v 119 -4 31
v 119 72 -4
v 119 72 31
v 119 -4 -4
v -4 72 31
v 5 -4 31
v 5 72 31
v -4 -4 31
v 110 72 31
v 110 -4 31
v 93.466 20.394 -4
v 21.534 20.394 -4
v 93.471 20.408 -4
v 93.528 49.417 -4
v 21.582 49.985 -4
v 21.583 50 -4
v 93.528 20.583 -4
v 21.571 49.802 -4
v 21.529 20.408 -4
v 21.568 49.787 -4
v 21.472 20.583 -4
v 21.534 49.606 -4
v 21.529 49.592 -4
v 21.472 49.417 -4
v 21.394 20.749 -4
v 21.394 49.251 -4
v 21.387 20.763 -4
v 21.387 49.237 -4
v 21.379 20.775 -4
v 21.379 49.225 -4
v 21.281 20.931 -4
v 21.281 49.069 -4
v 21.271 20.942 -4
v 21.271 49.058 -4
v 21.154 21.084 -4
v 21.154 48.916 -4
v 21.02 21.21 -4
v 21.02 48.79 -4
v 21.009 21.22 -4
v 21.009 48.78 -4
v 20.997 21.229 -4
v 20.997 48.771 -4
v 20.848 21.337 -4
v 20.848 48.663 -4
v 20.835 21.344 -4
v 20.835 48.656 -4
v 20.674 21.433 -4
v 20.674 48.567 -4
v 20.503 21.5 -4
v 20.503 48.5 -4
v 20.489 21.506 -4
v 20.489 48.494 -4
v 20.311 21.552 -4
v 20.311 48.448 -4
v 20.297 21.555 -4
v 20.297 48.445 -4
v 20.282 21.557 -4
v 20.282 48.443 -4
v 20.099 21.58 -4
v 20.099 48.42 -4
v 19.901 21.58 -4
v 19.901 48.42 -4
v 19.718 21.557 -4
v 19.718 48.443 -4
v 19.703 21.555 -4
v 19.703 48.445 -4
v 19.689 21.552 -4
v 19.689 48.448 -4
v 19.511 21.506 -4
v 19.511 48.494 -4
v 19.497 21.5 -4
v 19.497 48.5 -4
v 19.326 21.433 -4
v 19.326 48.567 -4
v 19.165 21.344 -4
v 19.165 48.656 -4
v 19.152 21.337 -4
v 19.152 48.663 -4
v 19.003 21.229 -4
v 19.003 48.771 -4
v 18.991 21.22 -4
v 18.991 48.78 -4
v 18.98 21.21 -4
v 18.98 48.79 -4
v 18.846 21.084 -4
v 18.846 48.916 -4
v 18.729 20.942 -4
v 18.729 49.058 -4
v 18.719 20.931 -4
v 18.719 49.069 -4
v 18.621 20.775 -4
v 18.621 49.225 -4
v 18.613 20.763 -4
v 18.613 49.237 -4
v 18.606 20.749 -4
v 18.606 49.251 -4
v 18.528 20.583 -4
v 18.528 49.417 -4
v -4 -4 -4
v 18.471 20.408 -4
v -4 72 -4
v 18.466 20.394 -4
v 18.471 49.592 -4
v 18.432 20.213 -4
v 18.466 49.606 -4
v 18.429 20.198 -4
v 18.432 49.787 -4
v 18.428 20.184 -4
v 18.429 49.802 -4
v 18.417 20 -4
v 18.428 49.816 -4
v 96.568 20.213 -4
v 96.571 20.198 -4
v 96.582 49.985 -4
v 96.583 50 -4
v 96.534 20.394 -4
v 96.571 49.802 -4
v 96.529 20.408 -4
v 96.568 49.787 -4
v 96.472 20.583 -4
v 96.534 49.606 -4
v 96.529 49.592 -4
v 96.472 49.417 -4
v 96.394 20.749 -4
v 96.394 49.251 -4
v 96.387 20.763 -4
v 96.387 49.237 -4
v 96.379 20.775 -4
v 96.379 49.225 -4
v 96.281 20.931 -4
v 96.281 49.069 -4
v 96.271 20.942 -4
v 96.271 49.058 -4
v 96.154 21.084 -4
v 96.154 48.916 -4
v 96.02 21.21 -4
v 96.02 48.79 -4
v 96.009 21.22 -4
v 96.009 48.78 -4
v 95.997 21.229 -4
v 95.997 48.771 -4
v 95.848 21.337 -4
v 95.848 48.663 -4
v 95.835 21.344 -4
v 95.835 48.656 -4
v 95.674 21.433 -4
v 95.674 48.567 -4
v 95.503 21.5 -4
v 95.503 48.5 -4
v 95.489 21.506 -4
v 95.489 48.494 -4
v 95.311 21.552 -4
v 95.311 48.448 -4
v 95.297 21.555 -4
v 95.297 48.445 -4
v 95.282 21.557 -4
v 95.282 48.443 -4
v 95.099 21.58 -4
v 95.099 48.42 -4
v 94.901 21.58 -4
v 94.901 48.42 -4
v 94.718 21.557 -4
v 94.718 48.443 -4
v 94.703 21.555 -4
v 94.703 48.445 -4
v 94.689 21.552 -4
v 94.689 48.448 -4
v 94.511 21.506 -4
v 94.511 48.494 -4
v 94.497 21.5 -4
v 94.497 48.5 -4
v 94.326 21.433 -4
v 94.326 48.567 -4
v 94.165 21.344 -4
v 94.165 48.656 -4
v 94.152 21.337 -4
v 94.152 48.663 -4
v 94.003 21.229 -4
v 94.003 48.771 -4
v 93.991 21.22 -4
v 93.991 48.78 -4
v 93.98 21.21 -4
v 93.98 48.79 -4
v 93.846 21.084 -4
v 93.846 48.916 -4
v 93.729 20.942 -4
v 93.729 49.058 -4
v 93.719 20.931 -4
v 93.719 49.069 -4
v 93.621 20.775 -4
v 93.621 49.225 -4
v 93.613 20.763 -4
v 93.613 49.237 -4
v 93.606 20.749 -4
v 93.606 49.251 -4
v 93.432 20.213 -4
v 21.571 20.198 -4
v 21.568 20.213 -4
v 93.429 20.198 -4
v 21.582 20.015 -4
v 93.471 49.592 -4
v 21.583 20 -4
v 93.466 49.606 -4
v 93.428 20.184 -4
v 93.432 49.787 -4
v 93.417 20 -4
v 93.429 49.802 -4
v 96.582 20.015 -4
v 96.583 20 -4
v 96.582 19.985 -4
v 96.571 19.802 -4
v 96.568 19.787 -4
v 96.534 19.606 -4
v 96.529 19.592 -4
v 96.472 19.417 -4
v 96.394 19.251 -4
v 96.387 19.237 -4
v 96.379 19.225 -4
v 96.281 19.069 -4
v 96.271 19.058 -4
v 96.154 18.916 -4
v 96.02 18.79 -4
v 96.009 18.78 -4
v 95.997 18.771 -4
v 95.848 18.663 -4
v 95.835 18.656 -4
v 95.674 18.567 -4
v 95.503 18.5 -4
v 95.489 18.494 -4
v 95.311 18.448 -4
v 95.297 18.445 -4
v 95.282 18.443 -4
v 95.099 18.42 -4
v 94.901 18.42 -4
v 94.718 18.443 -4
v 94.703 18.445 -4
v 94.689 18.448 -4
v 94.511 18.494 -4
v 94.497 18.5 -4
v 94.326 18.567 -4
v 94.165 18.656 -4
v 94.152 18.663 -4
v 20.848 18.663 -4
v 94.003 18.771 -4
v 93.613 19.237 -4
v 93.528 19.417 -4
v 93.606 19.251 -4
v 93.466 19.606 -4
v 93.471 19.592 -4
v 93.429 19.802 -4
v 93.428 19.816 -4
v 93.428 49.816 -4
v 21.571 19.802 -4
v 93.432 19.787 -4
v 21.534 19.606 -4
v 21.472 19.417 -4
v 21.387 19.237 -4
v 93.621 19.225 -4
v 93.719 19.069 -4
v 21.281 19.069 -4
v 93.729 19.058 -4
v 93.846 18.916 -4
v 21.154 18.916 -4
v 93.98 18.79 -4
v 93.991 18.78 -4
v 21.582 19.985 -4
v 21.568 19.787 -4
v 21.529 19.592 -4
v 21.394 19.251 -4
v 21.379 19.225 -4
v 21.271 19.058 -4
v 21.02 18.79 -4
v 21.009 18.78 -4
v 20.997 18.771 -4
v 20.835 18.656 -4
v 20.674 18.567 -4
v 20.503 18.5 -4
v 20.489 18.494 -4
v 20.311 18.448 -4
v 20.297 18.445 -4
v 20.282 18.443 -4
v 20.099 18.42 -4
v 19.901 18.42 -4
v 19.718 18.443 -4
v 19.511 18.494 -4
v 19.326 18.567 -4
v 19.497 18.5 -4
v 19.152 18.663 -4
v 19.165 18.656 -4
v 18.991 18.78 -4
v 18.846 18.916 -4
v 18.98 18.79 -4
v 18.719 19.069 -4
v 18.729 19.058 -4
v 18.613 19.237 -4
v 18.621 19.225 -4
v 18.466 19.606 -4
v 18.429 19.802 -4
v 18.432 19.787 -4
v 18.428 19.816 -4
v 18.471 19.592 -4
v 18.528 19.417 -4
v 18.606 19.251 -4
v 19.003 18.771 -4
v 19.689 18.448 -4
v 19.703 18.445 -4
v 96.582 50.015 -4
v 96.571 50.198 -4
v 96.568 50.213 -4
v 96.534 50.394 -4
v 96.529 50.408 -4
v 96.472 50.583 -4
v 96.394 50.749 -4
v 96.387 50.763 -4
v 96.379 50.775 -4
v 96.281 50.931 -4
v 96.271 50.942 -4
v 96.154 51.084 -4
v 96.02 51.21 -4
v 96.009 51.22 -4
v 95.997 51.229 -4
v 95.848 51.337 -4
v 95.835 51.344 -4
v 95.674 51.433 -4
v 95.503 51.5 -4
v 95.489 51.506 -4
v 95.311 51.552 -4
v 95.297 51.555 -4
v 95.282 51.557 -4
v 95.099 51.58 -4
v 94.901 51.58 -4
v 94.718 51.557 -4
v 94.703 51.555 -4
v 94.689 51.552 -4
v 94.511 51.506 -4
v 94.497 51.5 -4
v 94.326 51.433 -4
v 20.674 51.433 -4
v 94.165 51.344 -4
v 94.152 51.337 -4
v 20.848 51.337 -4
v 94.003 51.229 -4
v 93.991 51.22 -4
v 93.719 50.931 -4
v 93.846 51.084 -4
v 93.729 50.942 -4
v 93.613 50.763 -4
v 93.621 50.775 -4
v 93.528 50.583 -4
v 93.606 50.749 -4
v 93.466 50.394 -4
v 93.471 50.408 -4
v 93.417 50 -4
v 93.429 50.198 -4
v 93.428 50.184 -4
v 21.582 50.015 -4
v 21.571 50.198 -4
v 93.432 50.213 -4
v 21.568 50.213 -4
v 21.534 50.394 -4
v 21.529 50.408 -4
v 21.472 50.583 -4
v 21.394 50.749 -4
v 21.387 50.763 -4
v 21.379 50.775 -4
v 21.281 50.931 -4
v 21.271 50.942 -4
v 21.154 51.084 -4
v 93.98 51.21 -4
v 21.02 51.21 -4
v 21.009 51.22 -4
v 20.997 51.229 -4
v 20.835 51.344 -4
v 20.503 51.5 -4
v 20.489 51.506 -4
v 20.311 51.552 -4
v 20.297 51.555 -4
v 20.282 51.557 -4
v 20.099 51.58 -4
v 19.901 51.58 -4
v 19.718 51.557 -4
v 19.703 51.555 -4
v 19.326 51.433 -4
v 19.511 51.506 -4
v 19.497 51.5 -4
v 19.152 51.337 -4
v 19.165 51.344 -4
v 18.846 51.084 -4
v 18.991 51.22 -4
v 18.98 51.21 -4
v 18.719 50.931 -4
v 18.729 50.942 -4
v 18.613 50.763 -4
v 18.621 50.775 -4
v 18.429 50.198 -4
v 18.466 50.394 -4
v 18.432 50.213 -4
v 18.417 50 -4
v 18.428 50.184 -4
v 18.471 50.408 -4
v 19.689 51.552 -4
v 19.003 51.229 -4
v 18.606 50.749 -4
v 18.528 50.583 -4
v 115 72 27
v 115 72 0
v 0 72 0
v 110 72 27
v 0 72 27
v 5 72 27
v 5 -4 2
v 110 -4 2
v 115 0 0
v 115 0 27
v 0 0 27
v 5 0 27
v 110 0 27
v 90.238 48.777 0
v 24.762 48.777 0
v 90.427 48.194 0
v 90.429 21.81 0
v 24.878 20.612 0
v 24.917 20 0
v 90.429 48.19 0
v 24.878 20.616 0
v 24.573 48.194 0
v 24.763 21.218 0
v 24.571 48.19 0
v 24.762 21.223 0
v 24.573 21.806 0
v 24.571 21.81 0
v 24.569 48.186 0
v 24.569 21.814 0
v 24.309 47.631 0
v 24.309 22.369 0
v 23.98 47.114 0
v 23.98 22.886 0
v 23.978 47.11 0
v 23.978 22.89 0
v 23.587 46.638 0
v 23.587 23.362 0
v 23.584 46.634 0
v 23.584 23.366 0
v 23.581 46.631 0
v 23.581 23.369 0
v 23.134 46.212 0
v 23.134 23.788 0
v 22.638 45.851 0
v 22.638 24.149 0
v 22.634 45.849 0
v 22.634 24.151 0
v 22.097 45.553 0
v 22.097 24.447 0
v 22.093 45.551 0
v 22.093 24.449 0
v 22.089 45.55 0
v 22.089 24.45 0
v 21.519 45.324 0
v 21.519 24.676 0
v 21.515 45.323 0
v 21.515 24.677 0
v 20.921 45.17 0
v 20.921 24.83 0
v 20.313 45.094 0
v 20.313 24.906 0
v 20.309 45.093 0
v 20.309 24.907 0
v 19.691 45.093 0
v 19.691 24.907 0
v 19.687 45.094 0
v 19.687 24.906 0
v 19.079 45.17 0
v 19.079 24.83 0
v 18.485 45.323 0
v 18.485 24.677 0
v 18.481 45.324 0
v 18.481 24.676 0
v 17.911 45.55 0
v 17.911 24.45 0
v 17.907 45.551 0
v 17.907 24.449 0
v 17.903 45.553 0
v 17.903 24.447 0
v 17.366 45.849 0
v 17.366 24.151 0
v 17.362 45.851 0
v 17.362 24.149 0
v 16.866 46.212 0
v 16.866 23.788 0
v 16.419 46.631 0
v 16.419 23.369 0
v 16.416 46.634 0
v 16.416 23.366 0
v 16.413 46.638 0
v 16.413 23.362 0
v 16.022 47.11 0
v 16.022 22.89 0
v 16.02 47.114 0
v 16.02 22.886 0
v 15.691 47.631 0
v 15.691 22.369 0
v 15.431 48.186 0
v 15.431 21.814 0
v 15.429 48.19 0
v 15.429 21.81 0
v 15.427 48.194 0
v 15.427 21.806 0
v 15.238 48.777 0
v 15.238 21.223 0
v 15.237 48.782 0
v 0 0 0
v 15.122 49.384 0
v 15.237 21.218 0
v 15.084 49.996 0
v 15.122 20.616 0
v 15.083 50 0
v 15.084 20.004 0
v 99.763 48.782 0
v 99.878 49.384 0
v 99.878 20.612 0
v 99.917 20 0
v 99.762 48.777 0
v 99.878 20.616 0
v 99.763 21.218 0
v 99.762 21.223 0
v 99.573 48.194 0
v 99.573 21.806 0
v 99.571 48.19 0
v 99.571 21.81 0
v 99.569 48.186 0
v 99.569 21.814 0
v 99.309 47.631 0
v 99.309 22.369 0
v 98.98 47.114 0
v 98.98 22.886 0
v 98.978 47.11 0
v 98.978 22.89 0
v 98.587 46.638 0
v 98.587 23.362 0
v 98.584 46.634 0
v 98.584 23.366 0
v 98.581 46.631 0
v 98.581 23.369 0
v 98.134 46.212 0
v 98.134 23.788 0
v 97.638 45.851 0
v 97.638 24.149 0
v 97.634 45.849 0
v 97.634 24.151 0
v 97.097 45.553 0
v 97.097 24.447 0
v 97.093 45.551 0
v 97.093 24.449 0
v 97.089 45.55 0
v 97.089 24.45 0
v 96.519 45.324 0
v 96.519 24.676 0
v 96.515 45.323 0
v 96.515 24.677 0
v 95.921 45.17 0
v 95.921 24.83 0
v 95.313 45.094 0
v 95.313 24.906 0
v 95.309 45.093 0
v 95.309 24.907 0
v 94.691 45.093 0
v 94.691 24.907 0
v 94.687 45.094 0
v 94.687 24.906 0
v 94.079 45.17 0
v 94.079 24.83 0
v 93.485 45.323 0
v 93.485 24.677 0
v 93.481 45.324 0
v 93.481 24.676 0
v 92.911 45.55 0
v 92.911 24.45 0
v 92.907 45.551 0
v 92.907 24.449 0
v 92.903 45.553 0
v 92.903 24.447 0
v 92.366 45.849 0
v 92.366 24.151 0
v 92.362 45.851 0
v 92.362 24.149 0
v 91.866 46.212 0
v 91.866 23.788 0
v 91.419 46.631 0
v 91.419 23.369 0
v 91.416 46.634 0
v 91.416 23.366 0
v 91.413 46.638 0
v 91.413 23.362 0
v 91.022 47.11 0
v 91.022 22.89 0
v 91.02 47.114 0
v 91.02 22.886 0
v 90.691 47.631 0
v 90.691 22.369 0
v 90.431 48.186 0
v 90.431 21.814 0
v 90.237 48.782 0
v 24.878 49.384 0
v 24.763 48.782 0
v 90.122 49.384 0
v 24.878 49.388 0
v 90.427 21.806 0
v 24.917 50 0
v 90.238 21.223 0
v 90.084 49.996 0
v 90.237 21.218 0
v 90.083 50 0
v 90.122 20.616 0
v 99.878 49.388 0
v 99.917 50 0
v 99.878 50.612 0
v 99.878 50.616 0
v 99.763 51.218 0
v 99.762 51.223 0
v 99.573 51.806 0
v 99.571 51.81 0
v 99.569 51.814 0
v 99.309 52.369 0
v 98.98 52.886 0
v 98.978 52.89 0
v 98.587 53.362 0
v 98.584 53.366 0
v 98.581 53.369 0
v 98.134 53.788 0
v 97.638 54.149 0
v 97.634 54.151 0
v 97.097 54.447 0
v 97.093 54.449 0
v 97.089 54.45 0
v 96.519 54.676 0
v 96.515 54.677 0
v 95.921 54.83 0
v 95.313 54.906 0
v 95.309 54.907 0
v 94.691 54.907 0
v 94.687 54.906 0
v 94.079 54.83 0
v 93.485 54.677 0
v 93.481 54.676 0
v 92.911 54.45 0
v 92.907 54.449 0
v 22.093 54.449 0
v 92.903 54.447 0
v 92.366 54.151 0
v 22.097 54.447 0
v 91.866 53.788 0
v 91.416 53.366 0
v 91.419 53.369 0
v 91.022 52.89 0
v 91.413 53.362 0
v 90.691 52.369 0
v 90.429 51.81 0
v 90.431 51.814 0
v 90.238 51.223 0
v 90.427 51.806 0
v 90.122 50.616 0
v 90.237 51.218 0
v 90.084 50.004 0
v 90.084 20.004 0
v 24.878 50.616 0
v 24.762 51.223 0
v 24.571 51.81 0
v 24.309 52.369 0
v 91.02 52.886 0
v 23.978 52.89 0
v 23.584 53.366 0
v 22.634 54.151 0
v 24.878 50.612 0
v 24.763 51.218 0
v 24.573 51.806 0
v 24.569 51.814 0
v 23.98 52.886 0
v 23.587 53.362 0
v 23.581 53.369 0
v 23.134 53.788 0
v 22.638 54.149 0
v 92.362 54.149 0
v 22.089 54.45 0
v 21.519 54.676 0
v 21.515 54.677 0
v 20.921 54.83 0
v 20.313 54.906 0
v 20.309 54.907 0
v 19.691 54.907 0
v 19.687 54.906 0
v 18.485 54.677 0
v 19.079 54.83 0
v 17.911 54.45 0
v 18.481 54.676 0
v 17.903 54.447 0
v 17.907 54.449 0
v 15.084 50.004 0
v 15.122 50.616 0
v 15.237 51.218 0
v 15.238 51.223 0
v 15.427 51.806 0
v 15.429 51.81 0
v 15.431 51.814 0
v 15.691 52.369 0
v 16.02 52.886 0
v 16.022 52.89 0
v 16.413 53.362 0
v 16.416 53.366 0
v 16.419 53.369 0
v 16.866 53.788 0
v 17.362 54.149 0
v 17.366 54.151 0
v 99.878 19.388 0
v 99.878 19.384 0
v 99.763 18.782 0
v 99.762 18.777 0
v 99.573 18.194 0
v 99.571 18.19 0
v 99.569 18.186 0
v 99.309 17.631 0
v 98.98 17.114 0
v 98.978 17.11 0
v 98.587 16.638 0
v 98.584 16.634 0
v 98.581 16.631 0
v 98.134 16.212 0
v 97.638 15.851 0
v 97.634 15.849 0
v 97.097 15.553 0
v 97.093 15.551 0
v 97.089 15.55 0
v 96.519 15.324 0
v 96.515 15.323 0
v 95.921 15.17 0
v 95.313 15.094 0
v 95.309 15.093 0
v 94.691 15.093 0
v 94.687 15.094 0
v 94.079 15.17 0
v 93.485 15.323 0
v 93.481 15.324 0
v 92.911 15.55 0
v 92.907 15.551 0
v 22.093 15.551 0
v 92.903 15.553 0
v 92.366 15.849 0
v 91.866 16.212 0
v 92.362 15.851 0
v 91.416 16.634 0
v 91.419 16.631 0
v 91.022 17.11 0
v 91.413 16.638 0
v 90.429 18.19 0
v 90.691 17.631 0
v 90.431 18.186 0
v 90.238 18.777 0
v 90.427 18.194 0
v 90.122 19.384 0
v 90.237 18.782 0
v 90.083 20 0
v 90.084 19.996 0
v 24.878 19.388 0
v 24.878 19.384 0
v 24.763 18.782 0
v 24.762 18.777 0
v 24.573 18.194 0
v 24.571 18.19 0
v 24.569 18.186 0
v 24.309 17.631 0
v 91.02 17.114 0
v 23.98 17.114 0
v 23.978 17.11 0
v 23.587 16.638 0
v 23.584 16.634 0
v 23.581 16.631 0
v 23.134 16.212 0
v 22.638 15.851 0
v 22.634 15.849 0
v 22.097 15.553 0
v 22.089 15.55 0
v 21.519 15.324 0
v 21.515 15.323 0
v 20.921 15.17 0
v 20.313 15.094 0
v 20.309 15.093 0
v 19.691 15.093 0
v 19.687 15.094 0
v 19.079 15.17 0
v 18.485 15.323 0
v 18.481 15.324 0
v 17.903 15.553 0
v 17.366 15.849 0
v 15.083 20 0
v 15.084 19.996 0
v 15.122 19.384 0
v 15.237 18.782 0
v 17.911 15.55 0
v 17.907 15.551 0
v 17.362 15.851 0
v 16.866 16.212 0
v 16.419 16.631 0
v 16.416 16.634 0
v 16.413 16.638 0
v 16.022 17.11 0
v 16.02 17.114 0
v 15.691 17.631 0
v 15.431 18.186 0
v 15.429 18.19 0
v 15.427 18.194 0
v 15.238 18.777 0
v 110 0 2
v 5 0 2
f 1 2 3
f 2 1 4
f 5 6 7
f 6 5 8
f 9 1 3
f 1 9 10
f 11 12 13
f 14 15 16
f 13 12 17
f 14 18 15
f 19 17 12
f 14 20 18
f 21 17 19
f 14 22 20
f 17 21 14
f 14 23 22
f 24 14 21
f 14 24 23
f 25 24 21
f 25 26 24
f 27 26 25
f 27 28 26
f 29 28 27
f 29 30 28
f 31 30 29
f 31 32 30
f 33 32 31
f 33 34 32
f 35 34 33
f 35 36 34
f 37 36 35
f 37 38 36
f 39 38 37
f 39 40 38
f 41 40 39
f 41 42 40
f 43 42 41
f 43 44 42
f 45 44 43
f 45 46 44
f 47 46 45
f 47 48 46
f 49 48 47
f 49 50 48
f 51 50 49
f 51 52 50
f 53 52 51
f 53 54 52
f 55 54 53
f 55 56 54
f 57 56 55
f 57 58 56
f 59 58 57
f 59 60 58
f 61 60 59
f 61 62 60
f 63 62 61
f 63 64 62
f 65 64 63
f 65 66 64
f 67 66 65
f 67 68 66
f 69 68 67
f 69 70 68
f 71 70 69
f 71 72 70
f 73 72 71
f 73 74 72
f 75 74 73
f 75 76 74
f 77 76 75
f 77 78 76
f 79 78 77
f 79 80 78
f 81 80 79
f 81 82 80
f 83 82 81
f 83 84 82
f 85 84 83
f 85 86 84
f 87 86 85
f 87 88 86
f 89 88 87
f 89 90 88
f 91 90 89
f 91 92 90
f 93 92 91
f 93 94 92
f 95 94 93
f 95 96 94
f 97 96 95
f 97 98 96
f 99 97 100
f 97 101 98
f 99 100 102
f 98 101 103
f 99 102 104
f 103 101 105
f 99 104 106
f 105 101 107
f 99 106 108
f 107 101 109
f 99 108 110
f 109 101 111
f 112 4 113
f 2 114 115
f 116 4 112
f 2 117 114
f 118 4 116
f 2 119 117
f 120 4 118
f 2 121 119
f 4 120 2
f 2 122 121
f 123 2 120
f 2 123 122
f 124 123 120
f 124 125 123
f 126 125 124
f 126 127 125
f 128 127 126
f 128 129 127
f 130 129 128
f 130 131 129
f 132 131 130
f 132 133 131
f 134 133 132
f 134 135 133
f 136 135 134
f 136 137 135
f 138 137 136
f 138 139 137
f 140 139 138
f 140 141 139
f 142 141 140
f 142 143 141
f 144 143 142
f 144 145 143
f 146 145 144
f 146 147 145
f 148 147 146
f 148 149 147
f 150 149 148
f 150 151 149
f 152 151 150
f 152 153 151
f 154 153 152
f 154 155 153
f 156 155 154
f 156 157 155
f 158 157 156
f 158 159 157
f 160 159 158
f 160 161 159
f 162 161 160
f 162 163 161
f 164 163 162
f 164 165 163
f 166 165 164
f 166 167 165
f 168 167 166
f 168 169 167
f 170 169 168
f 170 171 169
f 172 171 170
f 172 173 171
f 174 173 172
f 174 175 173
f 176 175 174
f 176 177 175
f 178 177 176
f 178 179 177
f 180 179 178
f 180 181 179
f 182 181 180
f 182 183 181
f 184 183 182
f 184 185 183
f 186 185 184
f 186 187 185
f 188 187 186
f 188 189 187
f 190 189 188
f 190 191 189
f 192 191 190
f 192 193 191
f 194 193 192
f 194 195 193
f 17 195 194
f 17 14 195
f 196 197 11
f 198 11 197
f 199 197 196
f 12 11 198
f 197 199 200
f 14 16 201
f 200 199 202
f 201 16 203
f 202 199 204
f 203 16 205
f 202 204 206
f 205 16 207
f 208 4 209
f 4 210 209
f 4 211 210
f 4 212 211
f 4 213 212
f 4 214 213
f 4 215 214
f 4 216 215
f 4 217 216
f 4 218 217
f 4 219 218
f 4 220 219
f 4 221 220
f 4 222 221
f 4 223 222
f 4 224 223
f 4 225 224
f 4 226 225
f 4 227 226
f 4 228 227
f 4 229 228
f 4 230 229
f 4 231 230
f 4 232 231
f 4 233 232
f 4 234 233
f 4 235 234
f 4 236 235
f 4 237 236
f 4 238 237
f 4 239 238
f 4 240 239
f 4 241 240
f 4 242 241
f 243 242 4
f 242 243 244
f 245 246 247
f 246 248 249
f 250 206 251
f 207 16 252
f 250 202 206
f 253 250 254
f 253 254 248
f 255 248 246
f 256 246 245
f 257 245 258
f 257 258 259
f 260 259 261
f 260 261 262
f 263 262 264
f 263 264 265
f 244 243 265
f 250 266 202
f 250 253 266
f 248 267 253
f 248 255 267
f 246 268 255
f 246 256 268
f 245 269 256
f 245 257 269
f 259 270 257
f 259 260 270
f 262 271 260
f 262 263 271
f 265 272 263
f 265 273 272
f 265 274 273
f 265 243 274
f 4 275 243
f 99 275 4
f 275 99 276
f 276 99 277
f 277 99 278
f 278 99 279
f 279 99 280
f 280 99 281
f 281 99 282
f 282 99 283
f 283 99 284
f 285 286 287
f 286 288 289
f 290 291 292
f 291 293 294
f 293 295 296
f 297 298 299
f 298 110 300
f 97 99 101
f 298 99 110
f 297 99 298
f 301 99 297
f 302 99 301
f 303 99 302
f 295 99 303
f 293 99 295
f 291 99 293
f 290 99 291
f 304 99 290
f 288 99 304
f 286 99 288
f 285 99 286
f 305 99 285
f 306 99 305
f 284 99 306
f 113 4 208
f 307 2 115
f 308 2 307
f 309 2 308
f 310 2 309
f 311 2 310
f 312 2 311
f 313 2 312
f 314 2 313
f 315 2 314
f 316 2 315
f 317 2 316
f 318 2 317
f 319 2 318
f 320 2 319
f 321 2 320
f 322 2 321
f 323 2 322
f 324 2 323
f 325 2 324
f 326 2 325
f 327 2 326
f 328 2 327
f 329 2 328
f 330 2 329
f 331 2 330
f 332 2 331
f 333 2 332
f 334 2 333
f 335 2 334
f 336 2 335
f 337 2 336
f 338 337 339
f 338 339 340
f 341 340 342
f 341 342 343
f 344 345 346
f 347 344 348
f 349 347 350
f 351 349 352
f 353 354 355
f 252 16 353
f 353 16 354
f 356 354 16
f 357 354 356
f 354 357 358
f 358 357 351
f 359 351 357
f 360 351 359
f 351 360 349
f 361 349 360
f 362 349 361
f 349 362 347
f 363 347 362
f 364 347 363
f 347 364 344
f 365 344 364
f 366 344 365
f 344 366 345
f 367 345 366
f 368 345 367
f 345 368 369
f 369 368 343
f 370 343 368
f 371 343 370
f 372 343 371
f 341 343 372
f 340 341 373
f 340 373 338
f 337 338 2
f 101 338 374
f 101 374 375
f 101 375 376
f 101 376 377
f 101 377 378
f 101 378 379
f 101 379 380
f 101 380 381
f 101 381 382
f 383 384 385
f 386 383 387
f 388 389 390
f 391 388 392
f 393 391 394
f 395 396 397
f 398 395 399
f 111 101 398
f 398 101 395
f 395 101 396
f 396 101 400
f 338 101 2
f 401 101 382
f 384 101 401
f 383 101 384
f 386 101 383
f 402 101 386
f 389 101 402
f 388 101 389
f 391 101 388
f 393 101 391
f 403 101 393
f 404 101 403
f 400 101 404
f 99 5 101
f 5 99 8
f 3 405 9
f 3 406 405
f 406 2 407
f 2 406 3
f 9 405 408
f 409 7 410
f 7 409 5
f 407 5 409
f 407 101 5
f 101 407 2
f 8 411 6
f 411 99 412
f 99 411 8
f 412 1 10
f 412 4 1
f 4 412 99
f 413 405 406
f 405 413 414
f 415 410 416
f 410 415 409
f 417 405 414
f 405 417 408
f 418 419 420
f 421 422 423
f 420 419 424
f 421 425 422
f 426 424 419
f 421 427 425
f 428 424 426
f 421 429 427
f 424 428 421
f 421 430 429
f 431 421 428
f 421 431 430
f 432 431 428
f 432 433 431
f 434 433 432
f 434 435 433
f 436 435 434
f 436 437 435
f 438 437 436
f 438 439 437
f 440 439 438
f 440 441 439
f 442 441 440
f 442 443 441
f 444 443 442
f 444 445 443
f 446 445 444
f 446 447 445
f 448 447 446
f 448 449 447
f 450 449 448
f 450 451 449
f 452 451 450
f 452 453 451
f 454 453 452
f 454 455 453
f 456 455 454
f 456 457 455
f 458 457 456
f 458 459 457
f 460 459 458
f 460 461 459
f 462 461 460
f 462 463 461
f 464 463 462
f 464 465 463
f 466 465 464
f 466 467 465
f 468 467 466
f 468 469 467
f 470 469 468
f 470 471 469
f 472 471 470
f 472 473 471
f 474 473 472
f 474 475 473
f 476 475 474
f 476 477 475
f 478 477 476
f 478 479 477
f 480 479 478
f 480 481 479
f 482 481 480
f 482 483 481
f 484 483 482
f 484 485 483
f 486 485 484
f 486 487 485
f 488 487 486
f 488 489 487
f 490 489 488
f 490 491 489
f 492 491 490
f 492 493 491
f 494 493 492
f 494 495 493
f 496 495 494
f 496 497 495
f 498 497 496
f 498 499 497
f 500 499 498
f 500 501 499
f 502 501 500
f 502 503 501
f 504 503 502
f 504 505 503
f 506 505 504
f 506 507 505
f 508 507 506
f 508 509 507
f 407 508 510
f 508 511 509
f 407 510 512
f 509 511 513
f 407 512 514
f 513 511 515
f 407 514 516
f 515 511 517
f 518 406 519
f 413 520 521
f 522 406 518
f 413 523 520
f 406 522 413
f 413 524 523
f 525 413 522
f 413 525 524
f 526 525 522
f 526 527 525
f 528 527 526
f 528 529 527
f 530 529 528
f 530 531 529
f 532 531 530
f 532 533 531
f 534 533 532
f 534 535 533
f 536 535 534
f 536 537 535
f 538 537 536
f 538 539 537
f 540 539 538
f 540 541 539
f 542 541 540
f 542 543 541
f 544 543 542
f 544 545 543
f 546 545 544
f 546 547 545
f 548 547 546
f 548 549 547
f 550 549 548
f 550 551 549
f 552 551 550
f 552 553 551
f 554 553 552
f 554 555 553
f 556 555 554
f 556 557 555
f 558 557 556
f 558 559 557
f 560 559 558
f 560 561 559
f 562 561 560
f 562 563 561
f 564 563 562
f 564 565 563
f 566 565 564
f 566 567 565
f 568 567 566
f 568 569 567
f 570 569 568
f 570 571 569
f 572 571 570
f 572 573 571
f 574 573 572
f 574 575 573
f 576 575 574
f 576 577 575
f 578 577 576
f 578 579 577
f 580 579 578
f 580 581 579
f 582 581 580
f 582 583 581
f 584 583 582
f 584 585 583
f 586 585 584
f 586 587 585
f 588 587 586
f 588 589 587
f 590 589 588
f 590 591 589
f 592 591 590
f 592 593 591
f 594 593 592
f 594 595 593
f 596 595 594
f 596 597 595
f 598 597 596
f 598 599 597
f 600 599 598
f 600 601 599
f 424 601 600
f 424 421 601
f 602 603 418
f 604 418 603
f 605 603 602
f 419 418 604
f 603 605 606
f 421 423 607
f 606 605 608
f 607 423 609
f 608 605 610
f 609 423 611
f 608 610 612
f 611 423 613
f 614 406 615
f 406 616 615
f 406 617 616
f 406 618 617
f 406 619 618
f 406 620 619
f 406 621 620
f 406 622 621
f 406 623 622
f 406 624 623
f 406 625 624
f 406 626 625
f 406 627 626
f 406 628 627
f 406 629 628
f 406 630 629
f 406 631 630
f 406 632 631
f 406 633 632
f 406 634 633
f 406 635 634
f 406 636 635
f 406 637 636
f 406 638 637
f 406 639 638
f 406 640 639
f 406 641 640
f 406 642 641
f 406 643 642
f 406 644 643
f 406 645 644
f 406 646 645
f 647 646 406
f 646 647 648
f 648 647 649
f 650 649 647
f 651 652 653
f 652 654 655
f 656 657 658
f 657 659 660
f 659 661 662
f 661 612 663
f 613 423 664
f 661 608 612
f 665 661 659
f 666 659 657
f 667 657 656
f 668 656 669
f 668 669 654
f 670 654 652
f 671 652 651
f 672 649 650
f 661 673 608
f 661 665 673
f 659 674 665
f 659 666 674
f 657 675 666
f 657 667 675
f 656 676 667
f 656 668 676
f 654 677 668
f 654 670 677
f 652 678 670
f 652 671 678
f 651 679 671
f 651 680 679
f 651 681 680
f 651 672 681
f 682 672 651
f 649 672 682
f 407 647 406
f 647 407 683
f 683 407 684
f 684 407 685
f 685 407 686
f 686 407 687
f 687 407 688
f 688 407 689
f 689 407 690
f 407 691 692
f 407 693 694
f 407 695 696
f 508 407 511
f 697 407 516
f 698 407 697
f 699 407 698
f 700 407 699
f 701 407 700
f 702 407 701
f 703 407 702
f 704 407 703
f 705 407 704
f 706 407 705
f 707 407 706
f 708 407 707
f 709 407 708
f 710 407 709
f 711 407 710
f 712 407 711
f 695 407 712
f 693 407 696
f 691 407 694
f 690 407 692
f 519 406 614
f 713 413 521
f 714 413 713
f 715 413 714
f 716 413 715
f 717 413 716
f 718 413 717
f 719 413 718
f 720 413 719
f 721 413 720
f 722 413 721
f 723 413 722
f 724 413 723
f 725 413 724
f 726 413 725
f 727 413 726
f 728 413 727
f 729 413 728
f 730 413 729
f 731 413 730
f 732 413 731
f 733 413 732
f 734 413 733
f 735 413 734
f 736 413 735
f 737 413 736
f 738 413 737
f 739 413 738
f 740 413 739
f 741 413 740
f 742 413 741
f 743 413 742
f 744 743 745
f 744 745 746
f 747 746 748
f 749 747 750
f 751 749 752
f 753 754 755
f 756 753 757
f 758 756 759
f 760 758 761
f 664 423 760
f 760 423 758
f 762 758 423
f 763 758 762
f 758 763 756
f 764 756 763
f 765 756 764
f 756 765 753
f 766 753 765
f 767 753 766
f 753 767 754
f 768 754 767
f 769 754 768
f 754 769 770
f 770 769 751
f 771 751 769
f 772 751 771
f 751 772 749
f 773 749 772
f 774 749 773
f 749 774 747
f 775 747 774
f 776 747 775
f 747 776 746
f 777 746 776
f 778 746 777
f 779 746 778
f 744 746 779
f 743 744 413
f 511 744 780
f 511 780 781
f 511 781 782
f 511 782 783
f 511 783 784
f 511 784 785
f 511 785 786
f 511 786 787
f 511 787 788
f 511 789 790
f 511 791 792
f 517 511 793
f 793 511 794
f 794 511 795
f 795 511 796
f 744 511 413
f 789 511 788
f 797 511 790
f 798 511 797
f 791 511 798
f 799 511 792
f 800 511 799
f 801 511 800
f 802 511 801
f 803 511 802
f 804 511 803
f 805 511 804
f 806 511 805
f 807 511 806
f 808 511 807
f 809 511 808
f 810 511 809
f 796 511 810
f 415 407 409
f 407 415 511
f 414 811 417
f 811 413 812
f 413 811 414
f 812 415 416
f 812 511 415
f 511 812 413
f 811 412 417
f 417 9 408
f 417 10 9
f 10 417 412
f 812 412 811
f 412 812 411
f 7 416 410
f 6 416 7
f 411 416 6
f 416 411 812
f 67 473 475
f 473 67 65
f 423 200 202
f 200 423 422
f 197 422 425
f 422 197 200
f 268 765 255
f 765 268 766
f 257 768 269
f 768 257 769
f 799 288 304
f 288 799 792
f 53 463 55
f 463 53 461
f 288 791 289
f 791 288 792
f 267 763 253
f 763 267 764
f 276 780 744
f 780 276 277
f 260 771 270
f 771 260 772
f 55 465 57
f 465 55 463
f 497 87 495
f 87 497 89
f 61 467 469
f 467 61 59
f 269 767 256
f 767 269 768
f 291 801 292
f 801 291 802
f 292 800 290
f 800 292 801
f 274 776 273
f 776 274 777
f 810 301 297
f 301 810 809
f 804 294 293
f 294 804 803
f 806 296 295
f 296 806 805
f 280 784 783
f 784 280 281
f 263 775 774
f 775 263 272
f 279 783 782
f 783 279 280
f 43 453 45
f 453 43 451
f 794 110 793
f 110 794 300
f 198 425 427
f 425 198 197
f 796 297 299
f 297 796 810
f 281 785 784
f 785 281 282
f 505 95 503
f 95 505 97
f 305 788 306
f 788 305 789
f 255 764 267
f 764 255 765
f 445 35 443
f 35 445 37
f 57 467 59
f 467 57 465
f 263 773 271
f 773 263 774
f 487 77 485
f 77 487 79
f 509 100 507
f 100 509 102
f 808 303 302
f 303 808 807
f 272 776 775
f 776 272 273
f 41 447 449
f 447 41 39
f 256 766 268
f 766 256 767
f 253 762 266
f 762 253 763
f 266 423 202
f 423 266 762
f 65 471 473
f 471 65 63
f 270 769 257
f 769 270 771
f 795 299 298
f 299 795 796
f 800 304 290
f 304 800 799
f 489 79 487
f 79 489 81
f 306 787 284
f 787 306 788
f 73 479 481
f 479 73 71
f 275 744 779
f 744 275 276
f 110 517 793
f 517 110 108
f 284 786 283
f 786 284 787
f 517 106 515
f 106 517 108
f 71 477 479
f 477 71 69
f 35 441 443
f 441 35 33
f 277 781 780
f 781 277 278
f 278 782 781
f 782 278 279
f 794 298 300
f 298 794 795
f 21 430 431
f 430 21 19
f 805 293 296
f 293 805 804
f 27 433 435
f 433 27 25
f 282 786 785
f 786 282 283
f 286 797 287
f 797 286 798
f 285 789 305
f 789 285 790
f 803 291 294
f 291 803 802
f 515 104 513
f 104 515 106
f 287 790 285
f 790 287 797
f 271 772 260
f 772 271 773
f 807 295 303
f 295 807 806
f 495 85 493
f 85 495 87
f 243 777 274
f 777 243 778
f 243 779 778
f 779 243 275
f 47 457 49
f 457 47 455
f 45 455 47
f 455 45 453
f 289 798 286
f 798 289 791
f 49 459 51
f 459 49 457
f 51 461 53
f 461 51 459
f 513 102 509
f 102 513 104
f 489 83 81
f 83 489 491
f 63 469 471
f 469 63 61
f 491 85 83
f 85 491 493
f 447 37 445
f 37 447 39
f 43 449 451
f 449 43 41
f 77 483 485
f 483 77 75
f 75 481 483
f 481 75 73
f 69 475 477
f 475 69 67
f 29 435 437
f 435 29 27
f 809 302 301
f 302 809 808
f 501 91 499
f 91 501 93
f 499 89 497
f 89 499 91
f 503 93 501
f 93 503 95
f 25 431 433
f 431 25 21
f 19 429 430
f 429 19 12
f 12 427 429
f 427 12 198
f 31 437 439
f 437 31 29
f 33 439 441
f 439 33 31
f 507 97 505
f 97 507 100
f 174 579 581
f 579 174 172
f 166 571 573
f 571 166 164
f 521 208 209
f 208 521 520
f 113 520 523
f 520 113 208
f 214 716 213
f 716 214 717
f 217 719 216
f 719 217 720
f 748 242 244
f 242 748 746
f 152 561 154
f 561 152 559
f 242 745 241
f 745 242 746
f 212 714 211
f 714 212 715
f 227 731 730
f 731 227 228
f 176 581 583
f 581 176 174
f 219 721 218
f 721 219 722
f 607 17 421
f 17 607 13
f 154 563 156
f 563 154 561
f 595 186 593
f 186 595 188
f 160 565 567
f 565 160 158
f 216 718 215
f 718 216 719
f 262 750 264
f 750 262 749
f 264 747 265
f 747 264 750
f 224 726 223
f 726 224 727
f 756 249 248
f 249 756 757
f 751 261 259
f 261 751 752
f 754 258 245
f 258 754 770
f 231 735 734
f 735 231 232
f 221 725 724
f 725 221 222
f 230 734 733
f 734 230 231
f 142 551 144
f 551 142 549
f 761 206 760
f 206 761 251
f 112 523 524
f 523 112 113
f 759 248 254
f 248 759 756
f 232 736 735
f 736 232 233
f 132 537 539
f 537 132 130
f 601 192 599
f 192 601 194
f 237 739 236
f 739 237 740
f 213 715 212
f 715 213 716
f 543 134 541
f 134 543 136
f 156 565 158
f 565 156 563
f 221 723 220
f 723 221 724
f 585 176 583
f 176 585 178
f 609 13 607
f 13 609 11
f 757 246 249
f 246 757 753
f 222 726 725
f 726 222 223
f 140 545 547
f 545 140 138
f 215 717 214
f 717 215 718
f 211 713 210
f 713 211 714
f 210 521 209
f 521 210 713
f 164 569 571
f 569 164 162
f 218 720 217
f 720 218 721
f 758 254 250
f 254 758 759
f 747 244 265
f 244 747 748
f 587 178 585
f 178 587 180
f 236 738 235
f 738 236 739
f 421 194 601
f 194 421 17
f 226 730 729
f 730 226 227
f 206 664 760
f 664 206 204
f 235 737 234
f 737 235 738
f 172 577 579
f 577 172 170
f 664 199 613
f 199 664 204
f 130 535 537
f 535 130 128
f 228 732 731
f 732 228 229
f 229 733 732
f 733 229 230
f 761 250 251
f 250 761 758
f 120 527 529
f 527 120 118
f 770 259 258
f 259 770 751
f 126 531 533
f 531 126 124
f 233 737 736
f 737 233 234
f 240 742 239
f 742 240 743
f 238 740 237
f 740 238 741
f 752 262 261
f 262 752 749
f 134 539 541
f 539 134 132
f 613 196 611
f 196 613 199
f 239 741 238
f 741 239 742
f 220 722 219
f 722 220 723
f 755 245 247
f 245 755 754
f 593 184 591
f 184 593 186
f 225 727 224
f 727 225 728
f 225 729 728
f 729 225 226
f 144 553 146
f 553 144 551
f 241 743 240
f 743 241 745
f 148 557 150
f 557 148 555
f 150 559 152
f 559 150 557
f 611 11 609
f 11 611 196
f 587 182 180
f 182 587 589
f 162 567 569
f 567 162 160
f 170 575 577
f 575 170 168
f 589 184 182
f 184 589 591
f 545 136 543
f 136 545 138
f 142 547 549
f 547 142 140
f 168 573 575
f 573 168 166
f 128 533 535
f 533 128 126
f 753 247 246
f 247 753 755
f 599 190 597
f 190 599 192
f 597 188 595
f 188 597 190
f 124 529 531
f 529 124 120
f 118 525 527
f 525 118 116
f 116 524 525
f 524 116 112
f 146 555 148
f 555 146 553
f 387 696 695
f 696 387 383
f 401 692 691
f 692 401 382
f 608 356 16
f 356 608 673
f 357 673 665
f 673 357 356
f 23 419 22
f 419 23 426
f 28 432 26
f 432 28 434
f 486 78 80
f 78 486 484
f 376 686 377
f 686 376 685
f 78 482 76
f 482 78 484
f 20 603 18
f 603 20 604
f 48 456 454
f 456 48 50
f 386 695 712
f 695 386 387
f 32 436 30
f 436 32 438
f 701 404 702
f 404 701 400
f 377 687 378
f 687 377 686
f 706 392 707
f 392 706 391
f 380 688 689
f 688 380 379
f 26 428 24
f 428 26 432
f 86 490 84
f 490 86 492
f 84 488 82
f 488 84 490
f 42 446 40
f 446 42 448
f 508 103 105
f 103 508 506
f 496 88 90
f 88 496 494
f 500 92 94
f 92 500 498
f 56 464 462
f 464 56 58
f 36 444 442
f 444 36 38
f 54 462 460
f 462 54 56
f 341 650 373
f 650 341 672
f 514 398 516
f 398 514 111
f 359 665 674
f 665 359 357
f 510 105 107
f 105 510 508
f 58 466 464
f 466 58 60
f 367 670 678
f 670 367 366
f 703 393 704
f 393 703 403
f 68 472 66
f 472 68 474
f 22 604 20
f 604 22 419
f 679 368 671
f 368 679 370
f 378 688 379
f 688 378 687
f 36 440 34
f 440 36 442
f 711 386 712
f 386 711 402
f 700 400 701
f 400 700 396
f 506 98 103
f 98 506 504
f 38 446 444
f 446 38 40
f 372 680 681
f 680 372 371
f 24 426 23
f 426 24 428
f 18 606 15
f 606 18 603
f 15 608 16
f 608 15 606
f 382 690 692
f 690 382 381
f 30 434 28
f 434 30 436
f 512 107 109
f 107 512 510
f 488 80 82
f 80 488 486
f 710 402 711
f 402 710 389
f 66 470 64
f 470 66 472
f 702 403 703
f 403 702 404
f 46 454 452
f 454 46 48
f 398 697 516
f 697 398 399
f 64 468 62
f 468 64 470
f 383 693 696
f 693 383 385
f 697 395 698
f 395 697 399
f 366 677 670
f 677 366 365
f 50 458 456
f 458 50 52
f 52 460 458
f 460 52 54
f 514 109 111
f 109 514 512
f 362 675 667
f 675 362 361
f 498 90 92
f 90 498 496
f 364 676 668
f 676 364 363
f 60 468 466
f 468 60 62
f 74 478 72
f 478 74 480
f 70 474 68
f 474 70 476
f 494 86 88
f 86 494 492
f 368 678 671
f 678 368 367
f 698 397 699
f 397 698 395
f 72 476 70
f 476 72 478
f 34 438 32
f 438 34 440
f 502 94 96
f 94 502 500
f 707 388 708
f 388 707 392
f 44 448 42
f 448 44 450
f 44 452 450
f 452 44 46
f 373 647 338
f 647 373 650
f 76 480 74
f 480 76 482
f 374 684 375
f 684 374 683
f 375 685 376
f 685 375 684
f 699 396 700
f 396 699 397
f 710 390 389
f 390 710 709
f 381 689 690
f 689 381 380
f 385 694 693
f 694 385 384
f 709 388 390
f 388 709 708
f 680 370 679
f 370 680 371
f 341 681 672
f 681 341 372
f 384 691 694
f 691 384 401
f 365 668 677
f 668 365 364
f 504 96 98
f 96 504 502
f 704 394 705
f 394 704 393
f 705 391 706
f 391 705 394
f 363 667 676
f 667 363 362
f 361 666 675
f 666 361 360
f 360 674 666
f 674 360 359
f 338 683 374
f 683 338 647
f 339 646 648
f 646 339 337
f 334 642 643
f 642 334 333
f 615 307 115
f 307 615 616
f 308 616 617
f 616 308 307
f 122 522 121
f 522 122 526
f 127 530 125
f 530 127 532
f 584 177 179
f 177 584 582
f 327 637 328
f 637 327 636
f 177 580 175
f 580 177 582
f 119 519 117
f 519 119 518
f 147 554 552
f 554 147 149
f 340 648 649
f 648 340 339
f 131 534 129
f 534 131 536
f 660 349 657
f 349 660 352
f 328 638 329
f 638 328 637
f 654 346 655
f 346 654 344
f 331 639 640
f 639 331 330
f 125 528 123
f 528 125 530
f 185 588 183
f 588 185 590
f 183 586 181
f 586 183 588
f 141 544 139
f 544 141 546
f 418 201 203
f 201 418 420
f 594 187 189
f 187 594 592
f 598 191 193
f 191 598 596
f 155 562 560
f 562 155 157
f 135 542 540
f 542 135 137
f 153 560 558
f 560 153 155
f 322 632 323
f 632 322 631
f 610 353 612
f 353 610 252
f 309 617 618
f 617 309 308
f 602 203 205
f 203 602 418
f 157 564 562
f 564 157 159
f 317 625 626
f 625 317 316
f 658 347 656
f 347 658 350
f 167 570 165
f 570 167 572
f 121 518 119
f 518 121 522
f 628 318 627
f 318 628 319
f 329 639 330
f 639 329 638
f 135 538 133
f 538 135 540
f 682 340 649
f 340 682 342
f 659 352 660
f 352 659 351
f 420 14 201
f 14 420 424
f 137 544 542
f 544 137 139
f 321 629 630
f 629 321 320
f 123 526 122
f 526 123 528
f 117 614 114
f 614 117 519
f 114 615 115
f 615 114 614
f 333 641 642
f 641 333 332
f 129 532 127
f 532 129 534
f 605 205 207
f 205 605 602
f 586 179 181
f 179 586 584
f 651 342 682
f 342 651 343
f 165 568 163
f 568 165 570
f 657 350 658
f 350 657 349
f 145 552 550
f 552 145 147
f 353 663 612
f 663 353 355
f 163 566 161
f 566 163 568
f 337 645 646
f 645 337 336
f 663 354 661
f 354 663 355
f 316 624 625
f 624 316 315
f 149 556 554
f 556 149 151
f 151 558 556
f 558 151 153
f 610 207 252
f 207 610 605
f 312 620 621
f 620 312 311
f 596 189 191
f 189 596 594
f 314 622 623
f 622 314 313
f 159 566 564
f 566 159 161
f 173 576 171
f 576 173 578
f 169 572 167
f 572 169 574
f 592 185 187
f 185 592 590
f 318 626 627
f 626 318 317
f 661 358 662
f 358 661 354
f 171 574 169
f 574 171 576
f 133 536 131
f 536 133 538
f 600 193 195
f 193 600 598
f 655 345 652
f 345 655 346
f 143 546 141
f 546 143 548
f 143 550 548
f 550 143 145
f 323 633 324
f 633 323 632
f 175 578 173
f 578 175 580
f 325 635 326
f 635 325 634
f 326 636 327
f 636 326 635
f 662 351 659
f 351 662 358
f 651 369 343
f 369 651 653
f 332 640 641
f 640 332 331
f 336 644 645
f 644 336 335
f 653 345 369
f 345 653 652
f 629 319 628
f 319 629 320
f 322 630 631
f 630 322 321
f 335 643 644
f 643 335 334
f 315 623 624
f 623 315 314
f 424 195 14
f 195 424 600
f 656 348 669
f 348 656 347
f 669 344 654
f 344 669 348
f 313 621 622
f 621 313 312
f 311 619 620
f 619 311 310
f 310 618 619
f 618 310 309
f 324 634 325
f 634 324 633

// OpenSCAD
$width = 115;
$height = 101; 
$depth = 27;
$caseheight = 80;
$border = 4;

$fn = 50;

difference() {
    // BASE
    translate([-$border,-$border,-$border]) cube([$width+$border*2,$caseheight-$border,$depth+$border*2]);
    
    // Fit PC2
#    cube([$width,$height,$depth]);
    
    // cut outs
    translate([$border+1,-$border-1,$border/2]) cube([$width-($border+1)*2,$height,$depth+$border/2+1]);
    
    // mounting holes
    translate([20,20,-$border-0.1]) cylinder($border + 0.2,1.5,5);
    translate([$width-20,20,-$border-0.1]) cylinder($border + 0.2,1.5,5);
    translate([20,$caseheight-30,-$border-0.1]) cylinder($border + 0.2,1.5,5);
    translate([$width-20,$caseheight-30,-$border-0.1]) cylinder($border + 0.2,1.5,5);
}
